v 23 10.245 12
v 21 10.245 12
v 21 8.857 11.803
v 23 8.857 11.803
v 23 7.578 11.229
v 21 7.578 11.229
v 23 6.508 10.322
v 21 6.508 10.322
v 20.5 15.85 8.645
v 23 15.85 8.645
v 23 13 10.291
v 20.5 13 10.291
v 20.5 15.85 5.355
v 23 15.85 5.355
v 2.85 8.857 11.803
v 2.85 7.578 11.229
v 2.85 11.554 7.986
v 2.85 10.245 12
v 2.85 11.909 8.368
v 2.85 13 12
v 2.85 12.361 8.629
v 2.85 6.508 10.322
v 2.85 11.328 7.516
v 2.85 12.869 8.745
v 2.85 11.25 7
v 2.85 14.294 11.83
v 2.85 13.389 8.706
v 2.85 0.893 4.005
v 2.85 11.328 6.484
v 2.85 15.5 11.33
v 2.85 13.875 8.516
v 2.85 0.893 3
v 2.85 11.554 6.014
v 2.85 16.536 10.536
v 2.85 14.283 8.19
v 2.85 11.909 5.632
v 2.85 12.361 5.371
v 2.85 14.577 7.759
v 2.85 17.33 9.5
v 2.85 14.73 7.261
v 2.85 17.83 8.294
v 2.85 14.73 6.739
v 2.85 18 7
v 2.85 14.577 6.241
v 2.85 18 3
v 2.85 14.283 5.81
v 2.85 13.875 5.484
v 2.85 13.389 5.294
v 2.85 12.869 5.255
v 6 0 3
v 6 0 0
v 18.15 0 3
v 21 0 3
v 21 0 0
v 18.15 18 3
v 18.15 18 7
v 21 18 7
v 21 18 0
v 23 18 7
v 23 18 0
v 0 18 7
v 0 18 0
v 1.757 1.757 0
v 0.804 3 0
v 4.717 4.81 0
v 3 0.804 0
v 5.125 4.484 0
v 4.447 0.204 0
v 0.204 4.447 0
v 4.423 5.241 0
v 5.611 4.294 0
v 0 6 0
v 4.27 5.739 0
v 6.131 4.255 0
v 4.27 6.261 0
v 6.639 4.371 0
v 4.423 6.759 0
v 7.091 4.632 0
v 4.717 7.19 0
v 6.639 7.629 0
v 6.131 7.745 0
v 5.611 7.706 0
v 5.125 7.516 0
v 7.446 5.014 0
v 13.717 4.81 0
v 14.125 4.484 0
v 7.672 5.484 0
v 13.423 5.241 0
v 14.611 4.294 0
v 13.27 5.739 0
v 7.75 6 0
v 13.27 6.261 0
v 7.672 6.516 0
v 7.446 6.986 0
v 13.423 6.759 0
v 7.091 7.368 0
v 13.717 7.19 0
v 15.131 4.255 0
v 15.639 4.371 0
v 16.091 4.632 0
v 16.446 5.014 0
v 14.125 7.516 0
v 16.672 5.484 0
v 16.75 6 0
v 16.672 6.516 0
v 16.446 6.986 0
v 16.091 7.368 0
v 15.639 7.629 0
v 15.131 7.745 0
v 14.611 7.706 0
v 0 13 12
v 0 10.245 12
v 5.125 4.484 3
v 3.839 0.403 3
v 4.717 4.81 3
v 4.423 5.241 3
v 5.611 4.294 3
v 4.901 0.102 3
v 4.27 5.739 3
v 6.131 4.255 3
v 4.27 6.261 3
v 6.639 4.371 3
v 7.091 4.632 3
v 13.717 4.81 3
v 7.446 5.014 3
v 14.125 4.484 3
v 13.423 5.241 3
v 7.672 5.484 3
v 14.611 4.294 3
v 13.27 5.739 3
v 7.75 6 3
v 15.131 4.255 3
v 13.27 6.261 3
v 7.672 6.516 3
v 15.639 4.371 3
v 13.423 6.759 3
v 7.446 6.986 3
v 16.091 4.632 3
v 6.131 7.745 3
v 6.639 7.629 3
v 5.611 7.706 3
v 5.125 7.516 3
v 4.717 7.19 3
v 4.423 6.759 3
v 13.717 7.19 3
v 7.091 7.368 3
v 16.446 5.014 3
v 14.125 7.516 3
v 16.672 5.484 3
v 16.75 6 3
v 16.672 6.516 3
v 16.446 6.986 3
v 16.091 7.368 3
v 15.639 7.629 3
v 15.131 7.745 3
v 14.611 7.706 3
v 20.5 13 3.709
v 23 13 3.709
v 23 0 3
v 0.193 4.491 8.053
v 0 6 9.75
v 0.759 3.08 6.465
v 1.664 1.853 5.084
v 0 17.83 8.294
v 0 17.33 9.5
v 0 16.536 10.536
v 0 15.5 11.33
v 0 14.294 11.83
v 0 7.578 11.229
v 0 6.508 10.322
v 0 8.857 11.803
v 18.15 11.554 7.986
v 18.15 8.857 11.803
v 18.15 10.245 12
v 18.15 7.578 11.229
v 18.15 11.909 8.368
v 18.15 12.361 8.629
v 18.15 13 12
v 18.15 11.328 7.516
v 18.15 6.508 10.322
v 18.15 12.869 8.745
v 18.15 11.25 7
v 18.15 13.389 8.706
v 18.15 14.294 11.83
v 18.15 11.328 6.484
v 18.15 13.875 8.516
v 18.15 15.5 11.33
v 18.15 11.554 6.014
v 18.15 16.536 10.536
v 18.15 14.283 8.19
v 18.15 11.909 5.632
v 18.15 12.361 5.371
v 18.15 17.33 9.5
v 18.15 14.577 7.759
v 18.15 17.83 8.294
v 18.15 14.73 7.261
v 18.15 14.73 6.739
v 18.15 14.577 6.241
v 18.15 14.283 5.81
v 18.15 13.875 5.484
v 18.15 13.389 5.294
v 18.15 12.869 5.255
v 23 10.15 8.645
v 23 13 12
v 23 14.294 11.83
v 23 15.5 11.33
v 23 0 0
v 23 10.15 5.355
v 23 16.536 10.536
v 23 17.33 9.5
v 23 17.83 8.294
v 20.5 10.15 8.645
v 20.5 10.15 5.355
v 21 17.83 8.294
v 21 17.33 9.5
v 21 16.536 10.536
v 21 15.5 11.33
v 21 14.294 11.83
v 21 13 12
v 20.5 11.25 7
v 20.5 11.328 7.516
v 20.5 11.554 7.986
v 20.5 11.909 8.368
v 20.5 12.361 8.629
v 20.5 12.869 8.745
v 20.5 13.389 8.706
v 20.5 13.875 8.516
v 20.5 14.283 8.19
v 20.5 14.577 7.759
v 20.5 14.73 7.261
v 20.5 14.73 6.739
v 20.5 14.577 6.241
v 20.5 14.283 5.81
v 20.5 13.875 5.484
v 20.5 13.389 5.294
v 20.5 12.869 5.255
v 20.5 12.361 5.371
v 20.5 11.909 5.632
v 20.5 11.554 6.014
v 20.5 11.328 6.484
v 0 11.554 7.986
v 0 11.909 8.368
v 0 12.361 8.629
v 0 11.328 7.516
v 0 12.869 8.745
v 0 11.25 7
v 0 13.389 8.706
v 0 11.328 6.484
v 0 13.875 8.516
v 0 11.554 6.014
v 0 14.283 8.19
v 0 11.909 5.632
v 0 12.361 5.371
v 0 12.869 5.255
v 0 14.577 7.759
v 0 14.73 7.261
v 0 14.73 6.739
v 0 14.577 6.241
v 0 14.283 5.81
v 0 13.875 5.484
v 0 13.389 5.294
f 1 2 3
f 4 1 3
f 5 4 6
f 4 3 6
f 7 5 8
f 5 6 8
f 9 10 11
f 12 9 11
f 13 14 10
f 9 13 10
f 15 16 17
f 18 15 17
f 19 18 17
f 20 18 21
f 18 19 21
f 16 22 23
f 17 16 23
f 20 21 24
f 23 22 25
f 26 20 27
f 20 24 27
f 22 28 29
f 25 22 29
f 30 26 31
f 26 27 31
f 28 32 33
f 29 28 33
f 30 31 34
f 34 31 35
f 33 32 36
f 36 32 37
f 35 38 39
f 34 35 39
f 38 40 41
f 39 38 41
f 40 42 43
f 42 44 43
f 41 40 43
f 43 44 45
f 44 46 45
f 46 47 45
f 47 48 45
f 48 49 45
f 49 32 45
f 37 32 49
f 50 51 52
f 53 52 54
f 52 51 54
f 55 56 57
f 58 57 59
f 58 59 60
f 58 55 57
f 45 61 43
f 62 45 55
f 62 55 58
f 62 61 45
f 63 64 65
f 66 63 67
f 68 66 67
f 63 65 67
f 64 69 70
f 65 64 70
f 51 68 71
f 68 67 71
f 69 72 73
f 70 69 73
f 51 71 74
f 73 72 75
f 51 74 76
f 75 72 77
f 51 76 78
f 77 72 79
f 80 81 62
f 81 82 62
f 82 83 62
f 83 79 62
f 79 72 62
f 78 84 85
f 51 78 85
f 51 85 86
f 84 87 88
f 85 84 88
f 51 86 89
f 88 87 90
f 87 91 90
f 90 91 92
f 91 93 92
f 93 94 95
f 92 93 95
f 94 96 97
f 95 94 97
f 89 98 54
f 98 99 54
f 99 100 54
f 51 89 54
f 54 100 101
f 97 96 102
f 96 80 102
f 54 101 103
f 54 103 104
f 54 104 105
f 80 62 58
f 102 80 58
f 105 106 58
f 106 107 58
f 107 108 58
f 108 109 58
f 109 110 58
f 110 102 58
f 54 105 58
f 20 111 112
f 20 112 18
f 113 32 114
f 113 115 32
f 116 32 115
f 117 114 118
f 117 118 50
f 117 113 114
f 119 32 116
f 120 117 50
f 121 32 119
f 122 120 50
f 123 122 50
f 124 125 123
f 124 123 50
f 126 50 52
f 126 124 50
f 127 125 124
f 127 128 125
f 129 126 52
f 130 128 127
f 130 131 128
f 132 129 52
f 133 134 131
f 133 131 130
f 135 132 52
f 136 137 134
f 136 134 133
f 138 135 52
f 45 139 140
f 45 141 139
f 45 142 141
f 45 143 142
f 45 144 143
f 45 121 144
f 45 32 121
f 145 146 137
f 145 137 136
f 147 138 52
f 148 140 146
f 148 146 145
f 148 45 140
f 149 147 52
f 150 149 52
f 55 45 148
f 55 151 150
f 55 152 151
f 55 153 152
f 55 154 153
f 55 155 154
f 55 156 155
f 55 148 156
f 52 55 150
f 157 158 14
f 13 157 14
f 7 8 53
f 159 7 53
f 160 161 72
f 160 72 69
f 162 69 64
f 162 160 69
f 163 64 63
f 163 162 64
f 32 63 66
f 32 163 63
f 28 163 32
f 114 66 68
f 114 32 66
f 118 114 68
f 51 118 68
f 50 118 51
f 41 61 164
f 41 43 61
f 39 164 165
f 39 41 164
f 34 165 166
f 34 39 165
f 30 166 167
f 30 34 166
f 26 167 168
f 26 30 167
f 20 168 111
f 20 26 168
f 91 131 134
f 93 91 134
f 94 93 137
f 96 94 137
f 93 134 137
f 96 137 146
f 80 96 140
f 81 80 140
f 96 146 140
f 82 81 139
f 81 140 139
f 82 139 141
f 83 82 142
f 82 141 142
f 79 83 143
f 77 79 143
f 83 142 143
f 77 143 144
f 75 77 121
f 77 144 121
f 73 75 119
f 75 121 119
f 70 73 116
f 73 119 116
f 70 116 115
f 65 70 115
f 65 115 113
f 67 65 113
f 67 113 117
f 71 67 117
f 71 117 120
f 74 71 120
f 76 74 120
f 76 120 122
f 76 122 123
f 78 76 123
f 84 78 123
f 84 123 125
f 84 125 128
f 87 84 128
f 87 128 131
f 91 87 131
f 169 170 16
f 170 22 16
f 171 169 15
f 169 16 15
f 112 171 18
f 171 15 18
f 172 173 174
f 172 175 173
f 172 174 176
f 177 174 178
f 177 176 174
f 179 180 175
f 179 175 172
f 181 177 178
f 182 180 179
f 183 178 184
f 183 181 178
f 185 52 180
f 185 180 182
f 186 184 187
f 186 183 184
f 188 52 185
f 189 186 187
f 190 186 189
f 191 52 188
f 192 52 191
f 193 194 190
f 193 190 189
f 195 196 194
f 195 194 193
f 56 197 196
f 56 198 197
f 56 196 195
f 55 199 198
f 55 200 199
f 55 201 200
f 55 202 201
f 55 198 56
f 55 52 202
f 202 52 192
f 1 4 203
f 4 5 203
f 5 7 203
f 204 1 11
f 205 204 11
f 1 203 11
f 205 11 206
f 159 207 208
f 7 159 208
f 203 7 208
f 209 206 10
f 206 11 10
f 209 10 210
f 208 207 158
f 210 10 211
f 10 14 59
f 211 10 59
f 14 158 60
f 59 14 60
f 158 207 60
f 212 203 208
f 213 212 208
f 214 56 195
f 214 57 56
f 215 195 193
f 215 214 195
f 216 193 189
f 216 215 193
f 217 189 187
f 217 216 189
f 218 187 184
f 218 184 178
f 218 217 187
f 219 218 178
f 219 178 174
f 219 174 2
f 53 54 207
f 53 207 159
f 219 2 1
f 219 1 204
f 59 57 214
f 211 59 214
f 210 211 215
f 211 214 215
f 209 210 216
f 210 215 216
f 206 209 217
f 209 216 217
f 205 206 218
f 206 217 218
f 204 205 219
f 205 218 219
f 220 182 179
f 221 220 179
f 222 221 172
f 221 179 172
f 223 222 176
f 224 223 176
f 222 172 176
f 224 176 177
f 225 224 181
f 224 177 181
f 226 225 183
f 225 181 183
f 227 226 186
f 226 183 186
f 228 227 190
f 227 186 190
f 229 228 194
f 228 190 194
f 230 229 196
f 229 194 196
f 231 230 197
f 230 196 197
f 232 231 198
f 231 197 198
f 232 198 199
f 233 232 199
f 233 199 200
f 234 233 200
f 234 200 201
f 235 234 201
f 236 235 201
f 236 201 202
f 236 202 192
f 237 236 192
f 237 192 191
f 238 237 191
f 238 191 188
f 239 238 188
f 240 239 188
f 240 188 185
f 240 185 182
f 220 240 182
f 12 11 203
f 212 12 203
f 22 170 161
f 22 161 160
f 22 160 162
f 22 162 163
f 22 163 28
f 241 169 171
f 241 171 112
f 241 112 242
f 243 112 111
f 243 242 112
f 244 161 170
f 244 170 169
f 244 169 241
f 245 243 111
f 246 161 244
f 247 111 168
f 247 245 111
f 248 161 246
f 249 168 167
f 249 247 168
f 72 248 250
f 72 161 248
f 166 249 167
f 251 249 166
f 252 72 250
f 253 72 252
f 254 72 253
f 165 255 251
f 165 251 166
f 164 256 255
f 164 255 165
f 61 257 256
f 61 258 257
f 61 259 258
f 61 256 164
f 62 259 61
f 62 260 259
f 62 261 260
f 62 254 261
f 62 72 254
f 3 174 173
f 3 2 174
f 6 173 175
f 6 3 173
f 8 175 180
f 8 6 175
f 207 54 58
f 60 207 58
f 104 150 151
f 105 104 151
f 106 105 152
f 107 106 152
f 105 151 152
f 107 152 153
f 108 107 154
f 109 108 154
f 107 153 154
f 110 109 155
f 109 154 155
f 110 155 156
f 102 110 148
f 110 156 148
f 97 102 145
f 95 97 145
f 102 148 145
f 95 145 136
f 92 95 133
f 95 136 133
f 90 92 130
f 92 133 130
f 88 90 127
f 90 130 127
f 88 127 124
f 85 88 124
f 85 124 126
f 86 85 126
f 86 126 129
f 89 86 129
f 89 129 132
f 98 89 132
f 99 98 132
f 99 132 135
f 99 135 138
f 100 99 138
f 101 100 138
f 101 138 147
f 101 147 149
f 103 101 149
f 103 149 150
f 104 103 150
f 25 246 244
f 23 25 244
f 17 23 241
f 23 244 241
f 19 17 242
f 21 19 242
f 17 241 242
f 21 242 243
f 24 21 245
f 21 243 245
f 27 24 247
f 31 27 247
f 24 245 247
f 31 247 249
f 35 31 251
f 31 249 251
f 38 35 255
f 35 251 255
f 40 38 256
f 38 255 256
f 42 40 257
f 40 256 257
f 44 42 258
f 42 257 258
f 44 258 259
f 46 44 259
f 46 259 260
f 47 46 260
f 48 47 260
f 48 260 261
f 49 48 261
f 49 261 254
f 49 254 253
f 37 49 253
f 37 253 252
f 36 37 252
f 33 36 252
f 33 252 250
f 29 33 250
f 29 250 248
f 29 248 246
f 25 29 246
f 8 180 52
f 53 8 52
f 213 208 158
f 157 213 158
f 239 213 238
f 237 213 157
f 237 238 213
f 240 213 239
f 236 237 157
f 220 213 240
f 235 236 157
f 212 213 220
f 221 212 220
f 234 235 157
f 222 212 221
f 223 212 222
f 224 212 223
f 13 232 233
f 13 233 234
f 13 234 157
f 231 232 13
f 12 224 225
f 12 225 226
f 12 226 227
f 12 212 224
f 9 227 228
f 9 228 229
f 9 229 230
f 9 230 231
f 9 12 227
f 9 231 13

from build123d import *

# Parameters (mm, degrees)
F0_W      = 21
F0_H      = 18
F1_DEPTH  = 3
F2_W      = 2.85
F2_H      = 18
F3_DEPTH  = 9
F4_R      = 6
F5_R      = 1.75
F6_DEPTH  = 21.001
F7_R      = 5
F8_R      = 1.75
F9_DEPTH  = 3.001
F10_DEPTH = 2
F12_DEPTH = 2.5


with BuildPart() as f1:
    # F0 (on Top) → F1 (new body)
    with BuildSketch(Plane.XY):
        with Locations((10.5, 9)):
            Rectangle(F0_W, F0_H)
    extrude(amount=F1_DEPTH)

    # F2 (on face) → F3 (join)
    with BuildSketch(Plane.XY.offset(3)):
        with Locations((1.425, 9)):
            Rectangle(F2_W, F2_H)
        with Locations((19.575, 9)):
            Rectangle(F2_W, F2_H)
    extrude(amount=F3_DEPTH)

    # F4
    f4_edges = [f1.edges().sort_by_distance(p)[0] for p in [
        (0, 0, 6),
    ]]
    fillet(f4_edges, radius=F4_R)

    # F5 (on face) → F6 (cut, through all)
    with BuildSketch(Plane(origin=(0, 0, 0), x_dir=(0, -1, 0), z_dir=(-1, 0, 0))):
        with Locations((-13, 7)):
            Circle(F5_R)
        Polygon((0, 12), (-8, 12), (0, 3), align=None)
    extrude(amount=-F6_DEPTH, mode=Mode.SUBTRACT)

    # F7
    f7_edges = [f1.edges().sort_by_distance(p)[0] for p in [
        (1.425, 18, 12),
        (19.575, 18, 12),
        (1.425, 8, 12),
        (19.575, 8, 12),
    ]]
    fillet(f7_edges, radius=F7_R)

    # F8 (on face) → F9 (cut, through all)
    with BuildSketch(Plane.XY.offset(3)):
        with Locations((6, 6)):
            Circle(F8_R)
        with Locations((15, 6)):
            Circle(F8_R)
    extrude(amount=-F9_DEPTH, mode=Mode.SUBTRACT)

    # F10 (add): a face of the model
    f10_faces = [f1.faces().sort_by_distance(p)[0] for p in [
        (21, 9.8993100801, 5.1016484072),
    ]]
    extrude(f10_faces, amount=F10_DEPTH)

    # F11 (on face) → F12 (cut)
    with BuildSketch(Plane.YZ.offset(23)):
        Polygon((15.85, 5.3545517328), (15.85, 8.6454482672), (13, 10.2908965344), (10.15, 8.6454482672), (10.15, 5.3545517328), (13, 3.7091034656), align=None)
    extrude(amount=-F12_DEPTH, mode=Mode.SUBTRACT)


solid = f1.part
